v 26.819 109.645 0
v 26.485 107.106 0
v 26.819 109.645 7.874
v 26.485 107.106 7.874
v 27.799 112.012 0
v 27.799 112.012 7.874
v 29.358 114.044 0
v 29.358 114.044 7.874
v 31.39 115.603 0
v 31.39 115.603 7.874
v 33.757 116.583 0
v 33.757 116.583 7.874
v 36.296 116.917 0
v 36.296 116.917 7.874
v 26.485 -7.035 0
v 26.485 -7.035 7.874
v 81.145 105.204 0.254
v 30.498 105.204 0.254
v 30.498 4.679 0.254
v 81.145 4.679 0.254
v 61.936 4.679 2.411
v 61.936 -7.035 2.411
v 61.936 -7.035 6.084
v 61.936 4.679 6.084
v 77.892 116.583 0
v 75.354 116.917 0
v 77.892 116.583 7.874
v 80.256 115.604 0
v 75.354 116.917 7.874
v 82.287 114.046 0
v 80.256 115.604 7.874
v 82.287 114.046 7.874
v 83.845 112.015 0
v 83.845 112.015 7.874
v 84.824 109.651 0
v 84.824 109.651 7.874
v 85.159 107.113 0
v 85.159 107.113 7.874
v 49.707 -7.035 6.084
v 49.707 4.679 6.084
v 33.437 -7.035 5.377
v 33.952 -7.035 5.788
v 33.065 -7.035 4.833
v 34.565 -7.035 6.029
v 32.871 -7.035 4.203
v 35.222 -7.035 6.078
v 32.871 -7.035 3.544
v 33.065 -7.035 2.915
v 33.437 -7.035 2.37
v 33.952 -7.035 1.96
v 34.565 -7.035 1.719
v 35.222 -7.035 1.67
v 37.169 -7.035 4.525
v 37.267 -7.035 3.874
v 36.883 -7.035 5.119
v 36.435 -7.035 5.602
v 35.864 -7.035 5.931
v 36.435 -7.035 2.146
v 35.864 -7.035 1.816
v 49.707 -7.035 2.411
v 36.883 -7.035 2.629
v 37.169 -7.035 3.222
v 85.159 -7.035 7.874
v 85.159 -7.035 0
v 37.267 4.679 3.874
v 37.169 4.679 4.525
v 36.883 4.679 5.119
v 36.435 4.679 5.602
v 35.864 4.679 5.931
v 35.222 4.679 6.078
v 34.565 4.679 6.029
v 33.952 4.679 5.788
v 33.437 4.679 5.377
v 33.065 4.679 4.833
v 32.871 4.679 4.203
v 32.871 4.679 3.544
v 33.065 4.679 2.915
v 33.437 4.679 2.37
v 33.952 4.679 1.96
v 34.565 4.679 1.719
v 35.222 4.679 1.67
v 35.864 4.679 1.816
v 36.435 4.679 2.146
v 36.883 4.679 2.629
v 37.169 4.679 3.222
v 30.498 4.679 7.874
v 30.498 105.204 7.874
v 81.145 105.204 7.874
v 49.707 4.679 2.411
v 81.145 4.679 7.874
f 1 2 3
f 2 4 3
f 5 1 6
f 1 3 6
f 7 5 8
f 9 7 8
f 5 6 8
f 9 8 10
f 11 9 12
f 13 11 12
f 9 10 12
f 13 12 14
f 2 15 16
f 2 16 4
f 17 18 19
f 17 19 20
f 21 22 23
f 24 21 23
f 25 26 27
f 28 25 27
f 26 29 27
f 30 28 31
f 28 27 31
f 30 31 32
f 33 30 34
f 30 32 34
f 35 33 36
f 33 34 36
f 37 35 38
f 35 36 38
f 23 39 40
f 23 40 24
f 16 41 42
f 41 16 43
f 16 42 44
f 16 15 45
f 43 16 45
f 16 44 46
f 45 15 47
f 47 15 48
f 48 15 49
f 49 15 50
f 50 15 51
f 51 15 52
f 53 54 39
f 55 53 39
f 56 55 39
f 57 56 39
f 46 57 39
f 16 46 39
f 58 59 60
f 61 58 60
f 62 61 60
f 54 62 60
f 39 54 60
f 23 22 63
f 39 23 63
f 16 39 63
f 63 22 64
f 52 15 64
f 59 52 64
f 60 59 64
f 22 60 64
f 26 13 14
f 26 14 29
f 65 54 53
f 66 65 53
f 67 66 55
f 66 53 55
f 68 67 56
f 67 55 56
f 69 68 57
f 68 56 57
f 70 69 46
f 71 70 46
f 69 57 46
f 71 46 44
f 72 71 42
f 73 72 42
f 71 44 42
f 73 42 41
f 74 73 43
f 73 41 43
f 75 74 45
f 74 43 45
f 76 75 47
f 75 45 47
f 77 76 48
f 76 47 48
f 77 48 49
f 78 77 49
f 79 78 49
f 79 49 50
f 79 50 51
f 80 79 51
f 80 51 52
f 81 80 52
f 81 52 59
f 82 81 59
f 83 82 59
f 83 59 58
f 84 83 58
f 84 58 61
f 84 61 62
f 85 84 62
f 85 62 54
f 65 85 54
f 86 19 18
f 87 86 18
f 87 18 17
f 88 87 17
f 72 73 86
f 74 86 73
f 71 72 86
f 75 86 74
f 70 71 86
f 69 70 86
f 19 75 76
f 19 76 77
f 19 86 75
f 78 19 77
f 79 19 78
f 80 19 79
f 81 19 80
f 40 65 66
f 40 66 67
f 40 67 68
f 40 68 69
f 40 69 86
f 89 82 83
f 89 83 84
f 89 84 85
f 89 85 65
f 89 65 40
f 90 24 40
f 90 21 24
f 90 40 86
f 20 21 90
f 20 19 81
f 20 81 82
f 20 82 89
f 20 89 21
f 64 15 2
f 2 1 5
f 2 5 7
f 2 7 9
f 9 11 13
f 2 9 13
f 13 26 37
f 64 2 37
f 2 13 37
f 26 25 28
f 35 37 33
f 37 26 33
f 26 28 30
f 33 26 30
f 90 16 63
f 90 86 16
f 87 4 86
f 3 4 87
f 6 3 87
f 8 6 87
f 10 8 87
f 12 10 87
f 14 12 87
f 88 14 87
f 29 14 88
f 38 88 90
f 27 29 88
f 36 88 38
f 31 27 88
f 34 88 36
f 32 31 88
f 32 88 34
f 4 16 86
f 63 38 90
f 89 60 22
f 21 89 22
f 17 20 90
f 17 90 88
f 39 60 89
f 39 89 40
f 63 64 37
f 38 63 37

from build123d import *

# Parameters (mm, degrees)
F0_W     = 50.6464093924
F0_H     = 100.5250141025
F1_DEPTH = 0.254
F0_W_2   = 58.674
F0_H_2   = 123.952
F2_DEPTH = 7.874
F3_R     = 9.8113639175
F4_R     = 9.8044
F6_W     = 12.2285038233
F6_H     = 3.6733425222
F7_DEPTH = 17.272
F8_R     = 2.2102361545
F9_DEPTH = 12.192


# Not quite as in the source:
# - the program builds the solid bodies; features that only make, move or delete a surface that nothing else refers to are left out


with BuildPart() as f1:
    # F0 (on Top) → F1 (new body)
    with BuildSketch(Plane.XY):
        with Locations((55.8215677738, 54.941402014)):
            Rectangle(F0_W, F0_H)
    extrude(amount=F1_DEPTH)

    # F0 (on Top) → F2 (join)
    with BuildSketch(Plane.XY):
        with Locations((55.8215677738, 54.941402014)):
            Rectangle(F0_W_2, F0_H_2)
        with Locations((55.8215677738, 54.941402014)):
            Rectangle(F0_W, F0_H, mode=Mode.SUBTRACT)
    extrude(amount=F2_DEPTH)

    # F3
    f3_edges = [f1.edges().sort_by_distance(p)[0] for p in [
        (26.484568, 116.917402, 3.937),
    ]]
    fillet(f3_edges, radius=F3_R)

    # F4
    f4_edges = [f1.edges().sort_by_distance(p)[0] for p in [
        (85.158568, 116.917402, 3.937),
    ]]
    fillet(f4_edges, radius=F4_R)

    # F6 (on face) → F7 (cut)
    with BuildSketch(Plane.XZ.offset(7.034597986)):
        with Locations((55.8215677738, 4.2473026551)):
            Rectangle(F6_W, F6_H)
    extrude(amount=-F7_DEPTH, mode=Mode.SUBTRACT)

    # F8 (on face) → F9 (cut)
    with BuildSketch(Plane.XZ.offset(7.034597986)):
        with Locations((35.0567772985, 3.8737377618)):
            Circle(F8_R)
    extrude(amount=-F9_DEPTH, mode=Mode.SUBTRACT)


solid = f1.part
